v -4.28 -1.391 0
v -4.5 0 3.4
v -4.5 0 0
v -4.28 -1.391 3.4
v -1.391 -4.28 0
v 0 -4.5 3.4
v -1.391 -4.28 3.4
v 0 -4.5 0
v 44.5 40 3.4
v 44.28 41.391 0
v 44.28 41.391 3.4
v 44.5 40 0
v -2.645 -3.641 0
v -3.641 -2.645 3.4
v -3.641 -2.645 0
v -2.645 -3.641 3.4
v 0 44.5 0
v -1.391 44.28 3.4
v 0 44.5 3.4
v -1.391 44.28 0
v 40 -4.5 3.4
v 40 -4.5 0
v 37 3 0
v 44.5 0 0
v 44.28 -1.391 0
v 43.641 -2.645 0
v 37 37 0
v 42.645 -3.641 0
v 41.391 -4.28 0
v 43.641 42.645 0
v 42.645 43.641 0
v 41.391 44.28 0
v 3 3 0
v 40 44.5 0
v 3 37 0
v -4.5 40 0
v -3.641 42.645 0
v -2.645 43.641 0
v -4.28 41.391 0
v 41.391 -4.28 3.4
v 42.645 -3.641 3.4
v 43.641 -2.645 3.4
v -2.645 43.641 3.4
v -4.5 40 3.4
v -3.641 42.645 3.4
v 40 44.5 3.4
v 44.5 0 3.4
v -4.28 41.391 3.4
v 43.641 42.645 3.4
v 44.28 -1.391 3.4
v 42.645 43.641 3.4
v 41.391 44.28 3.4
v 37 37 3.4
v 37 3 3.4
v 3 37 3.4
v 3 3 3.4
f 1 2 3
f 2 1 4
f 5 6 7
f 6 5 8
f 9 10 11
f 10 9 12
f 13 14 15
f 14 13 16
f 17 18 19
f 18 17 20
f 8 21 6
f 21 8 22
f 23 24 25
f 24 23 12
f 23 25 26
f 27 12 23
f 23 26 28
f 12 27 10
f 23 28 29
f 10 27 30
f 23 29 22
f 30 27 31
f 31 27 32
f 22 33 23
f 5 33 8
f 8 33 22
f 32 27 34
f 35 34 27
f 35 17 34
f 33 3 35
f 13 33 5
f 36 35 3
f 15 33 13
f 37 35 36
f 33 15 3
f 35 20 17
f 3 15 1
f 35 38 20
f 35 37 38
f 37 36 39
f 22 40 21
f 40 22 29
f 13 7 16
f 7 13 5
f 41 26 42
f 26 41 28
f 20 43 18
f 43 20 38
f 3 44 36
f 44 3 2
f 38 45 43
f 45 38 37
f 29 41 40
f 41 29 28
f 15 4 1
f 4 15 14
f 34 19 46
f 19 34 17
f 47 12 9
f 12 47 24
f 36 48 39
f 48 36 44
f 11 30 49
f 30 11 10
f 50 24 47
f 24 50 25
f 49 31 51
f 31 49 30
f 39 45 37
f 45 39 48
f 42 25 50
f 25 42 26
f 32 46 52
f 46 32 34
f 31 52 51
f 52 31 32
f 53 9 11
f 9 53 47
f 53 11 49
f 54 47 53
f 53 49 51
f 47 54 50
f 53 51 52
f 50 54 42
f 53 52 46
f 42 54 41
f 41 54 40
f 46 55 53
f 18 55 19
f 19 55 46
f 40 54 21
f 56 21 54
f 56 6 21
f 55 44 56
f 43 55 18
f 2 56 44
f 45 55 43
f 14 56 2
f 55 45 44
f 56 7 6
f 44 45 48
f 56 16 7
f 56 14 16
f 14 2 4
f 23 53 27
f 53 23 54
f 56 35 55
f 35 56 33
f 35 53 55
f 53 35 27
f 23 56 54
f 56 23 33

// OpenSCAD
// file: vars.scad
$fn=20;
$fs=0.3;

split = false;
needs_center_plate_screw = true;
hotswap = true;

rows = 2;
columns = 2;
switchColumns = (split) ? columns / 2 : columns; // the number of columns to use when making the switch grid

// magnet dimens
magnet_d = 10.2; // diameter
magnet_t = 2.7; // thickness

switch_hole_size = 14;
switch_spacing = 3; // 3mm on either size of switch hole

plate_thickness = 1.4;
plate_spacer_thickness = 3.4;
helper_thickness = 6 - plate_thickness;

bezel_r = switch_spacing; // corner bezel radius
bezel_d = bezel_r/2 - bezel_r/2;

base_height = magnet_d + 1.5; //15; // height of base, inlcuding cutout

echo("total height", base_height + helper_thickness + plate_thickness + plate_spacer_thickness);

// the amount of space used to calculate grid size
ss = switch_hole_size + switch_spacing * 2; 

// overall case size before bezels
case_length = (split) ? ss * columns / 2 : ss * columns;
case_depth = ss * rows;

case_thickness_factor = 1.5;

// screw params
screw_h = 10;
screw_d = 3.2;
screw_head_diff = 2.5;
screw_head_h = 3;

cs_head_diff = 2.8;
cs_head_h = 2.8;

// outside screw hole 
screw_locs = [
    [ bezel_d, bezel_d], // front left
    [ case_length + bezel_d, bezel_d], // front right
    [ case_length + bezel_d, case_depth + bezel_d], // back right
    [ bezel_d, case_depth + bezel_d] // back left
];

// outer limits of case
back_of_case = screw_locs[2][1] + bezel_r * case_thickness_factor;
right_edge_of_case = screw_locs[2][0] + bezel_r * case_thickness_factor;



// m3 heat sert diameter
m3_hs_d = 5.5; 

jack_hole_d = 6.35;
jack_barrel_d = 8.5;

// pro micro
mcu_l = 33.75;
mcu_w = 18;
mcu_h = 1.5;
usb_w = 8;
usb_h = 3.75;

solder_channel_w = 3;
solder_channel_d = 2;
// main file
include <vars.scad>;

// return the location for a switch hole given a column and row grid number
function switch_location(column, row) = [ 
    (column * ss) + bezel_r, 
    (row * ss) + bezel_r ];

module screw() {
    union() {
        cylinder(d=screw_d + screw_head_diff, h=screw_head_h);
        translate([0, 0, screw_head_h])
            cylinder(d=screw_d, h=screw_h);
    }
}

module countersunk_screw() {
    union() {
        cylinder(d1=screw_d + cs_head_diff, d2=screw_d, h=cs_head_h);
        translate([0, 0, cs_head_h-0.01])
            cylinder(d=screw_d, h=screw_h + 0.01);
    }
}

module case_shape(height) {
    hull() {
        for (i = [0:len(screw_locs) - 1]) {
            screw_x = screw_locs[i][0]; screw_y = screw_locs[i][1];

            translate([screw_x, screw_y, 0])
                cylinder(r=bezel_r * case_thickness_factor, h=height);
        }
    }
}

module case_cavity(height) {
    right_switch = (split) ? columns/2 : columns;

    front_left = switch_location(0, 0);
    back_right = switch_location(right_switch, rows);

    cavity_length = back_right[0] - switch_spacing*2 - front_left[0];
    cavity_depth = back_right[1] - switch_spacing*2 - front_left[1];

    translate([front_left[0], front_left[1], 0])
        cube([cavity_length, cavity_depth, height]);
}

module heatsert_guide(height) {
    union() {
        cylinder(d=m3_hs_d, h=height);
        translate([0, 0, height*0.85])
            cylinder(d=m3_hs_d+0.5, h=height*0.23);
    }
}

module pro_micro() {
    union() {
        // board base
        cube([mcu_w, mcu_l, mcu_h + usb_h]);

        // usb port
        //translate([mcu_w/2 - usb_w/2, 0, mcu_h - 0.1])
        //    cube([usb_w, mcu_l, usb_h + 0.1]);

        // room for pins at front
        translate([0, 0, mcu_h])
            cube([mcu_w, mcu_l - 3, base_height]);

        // inside solder channel
        translate([0, 0, -solder_channel_d])
            cube([solder_channel_w, mcu_l - 1, solder_channel_d + 0.1]);

        // outside solder channel
        translate([mcu_w - solder_channel_w, 0, -solder_channel_d])
            cube([solder_channel_w, mcu_l - 1, solder_channel_d + 0.1]);
    }
}

module jack_hole() {
    // trrs jack mounting hole
    rotate(90, [1, 0, 0])
        cylinder(d=jack_hole_d, h=case_depth/2);
    
    // trrs jack barrel hole
    translate([0, -1.75, 0])
        rotate(90, [1, 0, 0])
            cylinder(d=jack_barrel_d, h=case_depth/2);
}

// screw holes
module screw_holes() {
    for (i = [0:len(screw_locs) - 1]) {
        screw_x = screw_locs[i][0]; screw_y = screw_locs[i][1];
        
        translate([screw_x, screw_y, -0.01])
            //rotate(180, [1, 0, 0])
                countersunk_screw();
    }
}

module magnet_holes() {
    union() {
        for (i = [0:rows-1]) {
            switch_loc = switch_location(1, i);

            translate([right_edge_of_case - magnet_t + 0.01, switch_loc[1] + switch_hole_size/2, base_height/2])
            rotate(90, [0, 1, 0]) {
                cylinder(d=magnet_d, h=magnet_t);

                // little holes to stick something in to forcibly remove magnet if desired
                translate([0, 0, -magnet_t*2])
                    cylinder(d=3, h=magnet_t*4);
            }
        }
    }
}

module usb_c_board() {
    width = 8.3;
    height = 2.5;

    x_pos = width/2 - height/2;

    board_w = 15;
    board_l = 14.5;
    port_protrusion = 3;

    hull() {
        translate([-x_pos, 0, 0])
            rotate(90, [1, 0, 0])
                cylinder(d=height, h=width);

        translate([x_pos, 0, 0])
            rotate(90, [1, 0, 0])
                cylinder(d=height, h=width);
    }

    translate([0, -board_l/2 - port_protrusion, 0])
    cube([board_w, board_l, 1], center=true);
}

//usb_c_board();

module plate_spacer() {
    difference() {
        case_shape(plate_spacer_thickness);
        case_cavity(plate_spacer_thickness);

        translate([0,0,screw_h])
            screw_holes();
    }
}

plate_spacer();
